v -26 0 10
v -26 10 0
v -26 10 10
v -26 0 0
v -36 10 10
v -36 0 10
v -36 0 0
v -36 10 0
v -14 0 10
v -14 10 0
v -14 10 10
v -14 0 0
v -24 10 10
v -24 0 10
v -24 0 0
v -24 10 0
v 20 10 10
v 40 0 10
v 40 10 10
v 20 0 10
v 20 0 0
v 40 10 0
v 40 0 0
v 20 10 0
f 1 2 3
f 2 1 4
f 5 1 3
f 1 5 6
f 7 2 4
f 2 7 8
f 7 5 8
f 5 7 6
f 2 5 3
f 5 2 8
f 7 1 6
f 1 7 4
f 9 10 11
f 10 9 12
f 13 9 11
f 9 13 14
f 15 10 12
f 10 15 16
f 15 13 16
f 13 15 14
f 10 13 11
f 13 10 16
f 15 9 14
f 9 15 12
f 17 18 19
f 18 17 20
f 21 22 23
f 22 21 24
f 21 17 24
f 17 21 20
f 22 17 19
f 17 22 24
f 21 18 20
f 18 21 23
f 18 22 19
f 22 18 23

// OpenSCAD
// file: fixtures.scad
// Fusecheck-gate fixture (scripts/fusecheck-check.sh --selftest, issue #627):
// a tiny two-pose design the fixture manifests gate. Each pose is one way a
// body count can land, and the manifests pin the verdict each must produce:
//   separable   two cubes with a 2 mm gap — two separable bodies (the count
//               every passing assert row expects)
//   fused       two cubes sharing a full face — one connected body over the
//               face-adjacency graph (the count the WARN row cannot meet and
//               the mandatory control must stay at)
//   assembled   both poses side by side, the ungated default render
// Units: mm. Plain cubes on purpose — the selftest renders it, nobody prints
// it, and the body count must stay 2 / 1 at any curve quality.
part = "assembled";     // which pose to render (see the header)

module separable() {
    translate([-6, 0, 0]) cube([10, 10, 10]);
    translate([+6, 0, 0]) cube([10, 10, 10]);
}

module fused() {
    translate([-10, 0, 0]) cube([10, 10, 10]);
    cube([10, 10, 10]);
}

module assembled() {
    translate([-30, 0, 0]) separable();
    translate([+30, 0, 0]) fused();
}

if (part == "separable") separable();
else if (part == "fused") fused();
else assembled();
// main file
// One hop toward fixtures.scad (issue #766 transitive closure).
include <fixtures.scad>
